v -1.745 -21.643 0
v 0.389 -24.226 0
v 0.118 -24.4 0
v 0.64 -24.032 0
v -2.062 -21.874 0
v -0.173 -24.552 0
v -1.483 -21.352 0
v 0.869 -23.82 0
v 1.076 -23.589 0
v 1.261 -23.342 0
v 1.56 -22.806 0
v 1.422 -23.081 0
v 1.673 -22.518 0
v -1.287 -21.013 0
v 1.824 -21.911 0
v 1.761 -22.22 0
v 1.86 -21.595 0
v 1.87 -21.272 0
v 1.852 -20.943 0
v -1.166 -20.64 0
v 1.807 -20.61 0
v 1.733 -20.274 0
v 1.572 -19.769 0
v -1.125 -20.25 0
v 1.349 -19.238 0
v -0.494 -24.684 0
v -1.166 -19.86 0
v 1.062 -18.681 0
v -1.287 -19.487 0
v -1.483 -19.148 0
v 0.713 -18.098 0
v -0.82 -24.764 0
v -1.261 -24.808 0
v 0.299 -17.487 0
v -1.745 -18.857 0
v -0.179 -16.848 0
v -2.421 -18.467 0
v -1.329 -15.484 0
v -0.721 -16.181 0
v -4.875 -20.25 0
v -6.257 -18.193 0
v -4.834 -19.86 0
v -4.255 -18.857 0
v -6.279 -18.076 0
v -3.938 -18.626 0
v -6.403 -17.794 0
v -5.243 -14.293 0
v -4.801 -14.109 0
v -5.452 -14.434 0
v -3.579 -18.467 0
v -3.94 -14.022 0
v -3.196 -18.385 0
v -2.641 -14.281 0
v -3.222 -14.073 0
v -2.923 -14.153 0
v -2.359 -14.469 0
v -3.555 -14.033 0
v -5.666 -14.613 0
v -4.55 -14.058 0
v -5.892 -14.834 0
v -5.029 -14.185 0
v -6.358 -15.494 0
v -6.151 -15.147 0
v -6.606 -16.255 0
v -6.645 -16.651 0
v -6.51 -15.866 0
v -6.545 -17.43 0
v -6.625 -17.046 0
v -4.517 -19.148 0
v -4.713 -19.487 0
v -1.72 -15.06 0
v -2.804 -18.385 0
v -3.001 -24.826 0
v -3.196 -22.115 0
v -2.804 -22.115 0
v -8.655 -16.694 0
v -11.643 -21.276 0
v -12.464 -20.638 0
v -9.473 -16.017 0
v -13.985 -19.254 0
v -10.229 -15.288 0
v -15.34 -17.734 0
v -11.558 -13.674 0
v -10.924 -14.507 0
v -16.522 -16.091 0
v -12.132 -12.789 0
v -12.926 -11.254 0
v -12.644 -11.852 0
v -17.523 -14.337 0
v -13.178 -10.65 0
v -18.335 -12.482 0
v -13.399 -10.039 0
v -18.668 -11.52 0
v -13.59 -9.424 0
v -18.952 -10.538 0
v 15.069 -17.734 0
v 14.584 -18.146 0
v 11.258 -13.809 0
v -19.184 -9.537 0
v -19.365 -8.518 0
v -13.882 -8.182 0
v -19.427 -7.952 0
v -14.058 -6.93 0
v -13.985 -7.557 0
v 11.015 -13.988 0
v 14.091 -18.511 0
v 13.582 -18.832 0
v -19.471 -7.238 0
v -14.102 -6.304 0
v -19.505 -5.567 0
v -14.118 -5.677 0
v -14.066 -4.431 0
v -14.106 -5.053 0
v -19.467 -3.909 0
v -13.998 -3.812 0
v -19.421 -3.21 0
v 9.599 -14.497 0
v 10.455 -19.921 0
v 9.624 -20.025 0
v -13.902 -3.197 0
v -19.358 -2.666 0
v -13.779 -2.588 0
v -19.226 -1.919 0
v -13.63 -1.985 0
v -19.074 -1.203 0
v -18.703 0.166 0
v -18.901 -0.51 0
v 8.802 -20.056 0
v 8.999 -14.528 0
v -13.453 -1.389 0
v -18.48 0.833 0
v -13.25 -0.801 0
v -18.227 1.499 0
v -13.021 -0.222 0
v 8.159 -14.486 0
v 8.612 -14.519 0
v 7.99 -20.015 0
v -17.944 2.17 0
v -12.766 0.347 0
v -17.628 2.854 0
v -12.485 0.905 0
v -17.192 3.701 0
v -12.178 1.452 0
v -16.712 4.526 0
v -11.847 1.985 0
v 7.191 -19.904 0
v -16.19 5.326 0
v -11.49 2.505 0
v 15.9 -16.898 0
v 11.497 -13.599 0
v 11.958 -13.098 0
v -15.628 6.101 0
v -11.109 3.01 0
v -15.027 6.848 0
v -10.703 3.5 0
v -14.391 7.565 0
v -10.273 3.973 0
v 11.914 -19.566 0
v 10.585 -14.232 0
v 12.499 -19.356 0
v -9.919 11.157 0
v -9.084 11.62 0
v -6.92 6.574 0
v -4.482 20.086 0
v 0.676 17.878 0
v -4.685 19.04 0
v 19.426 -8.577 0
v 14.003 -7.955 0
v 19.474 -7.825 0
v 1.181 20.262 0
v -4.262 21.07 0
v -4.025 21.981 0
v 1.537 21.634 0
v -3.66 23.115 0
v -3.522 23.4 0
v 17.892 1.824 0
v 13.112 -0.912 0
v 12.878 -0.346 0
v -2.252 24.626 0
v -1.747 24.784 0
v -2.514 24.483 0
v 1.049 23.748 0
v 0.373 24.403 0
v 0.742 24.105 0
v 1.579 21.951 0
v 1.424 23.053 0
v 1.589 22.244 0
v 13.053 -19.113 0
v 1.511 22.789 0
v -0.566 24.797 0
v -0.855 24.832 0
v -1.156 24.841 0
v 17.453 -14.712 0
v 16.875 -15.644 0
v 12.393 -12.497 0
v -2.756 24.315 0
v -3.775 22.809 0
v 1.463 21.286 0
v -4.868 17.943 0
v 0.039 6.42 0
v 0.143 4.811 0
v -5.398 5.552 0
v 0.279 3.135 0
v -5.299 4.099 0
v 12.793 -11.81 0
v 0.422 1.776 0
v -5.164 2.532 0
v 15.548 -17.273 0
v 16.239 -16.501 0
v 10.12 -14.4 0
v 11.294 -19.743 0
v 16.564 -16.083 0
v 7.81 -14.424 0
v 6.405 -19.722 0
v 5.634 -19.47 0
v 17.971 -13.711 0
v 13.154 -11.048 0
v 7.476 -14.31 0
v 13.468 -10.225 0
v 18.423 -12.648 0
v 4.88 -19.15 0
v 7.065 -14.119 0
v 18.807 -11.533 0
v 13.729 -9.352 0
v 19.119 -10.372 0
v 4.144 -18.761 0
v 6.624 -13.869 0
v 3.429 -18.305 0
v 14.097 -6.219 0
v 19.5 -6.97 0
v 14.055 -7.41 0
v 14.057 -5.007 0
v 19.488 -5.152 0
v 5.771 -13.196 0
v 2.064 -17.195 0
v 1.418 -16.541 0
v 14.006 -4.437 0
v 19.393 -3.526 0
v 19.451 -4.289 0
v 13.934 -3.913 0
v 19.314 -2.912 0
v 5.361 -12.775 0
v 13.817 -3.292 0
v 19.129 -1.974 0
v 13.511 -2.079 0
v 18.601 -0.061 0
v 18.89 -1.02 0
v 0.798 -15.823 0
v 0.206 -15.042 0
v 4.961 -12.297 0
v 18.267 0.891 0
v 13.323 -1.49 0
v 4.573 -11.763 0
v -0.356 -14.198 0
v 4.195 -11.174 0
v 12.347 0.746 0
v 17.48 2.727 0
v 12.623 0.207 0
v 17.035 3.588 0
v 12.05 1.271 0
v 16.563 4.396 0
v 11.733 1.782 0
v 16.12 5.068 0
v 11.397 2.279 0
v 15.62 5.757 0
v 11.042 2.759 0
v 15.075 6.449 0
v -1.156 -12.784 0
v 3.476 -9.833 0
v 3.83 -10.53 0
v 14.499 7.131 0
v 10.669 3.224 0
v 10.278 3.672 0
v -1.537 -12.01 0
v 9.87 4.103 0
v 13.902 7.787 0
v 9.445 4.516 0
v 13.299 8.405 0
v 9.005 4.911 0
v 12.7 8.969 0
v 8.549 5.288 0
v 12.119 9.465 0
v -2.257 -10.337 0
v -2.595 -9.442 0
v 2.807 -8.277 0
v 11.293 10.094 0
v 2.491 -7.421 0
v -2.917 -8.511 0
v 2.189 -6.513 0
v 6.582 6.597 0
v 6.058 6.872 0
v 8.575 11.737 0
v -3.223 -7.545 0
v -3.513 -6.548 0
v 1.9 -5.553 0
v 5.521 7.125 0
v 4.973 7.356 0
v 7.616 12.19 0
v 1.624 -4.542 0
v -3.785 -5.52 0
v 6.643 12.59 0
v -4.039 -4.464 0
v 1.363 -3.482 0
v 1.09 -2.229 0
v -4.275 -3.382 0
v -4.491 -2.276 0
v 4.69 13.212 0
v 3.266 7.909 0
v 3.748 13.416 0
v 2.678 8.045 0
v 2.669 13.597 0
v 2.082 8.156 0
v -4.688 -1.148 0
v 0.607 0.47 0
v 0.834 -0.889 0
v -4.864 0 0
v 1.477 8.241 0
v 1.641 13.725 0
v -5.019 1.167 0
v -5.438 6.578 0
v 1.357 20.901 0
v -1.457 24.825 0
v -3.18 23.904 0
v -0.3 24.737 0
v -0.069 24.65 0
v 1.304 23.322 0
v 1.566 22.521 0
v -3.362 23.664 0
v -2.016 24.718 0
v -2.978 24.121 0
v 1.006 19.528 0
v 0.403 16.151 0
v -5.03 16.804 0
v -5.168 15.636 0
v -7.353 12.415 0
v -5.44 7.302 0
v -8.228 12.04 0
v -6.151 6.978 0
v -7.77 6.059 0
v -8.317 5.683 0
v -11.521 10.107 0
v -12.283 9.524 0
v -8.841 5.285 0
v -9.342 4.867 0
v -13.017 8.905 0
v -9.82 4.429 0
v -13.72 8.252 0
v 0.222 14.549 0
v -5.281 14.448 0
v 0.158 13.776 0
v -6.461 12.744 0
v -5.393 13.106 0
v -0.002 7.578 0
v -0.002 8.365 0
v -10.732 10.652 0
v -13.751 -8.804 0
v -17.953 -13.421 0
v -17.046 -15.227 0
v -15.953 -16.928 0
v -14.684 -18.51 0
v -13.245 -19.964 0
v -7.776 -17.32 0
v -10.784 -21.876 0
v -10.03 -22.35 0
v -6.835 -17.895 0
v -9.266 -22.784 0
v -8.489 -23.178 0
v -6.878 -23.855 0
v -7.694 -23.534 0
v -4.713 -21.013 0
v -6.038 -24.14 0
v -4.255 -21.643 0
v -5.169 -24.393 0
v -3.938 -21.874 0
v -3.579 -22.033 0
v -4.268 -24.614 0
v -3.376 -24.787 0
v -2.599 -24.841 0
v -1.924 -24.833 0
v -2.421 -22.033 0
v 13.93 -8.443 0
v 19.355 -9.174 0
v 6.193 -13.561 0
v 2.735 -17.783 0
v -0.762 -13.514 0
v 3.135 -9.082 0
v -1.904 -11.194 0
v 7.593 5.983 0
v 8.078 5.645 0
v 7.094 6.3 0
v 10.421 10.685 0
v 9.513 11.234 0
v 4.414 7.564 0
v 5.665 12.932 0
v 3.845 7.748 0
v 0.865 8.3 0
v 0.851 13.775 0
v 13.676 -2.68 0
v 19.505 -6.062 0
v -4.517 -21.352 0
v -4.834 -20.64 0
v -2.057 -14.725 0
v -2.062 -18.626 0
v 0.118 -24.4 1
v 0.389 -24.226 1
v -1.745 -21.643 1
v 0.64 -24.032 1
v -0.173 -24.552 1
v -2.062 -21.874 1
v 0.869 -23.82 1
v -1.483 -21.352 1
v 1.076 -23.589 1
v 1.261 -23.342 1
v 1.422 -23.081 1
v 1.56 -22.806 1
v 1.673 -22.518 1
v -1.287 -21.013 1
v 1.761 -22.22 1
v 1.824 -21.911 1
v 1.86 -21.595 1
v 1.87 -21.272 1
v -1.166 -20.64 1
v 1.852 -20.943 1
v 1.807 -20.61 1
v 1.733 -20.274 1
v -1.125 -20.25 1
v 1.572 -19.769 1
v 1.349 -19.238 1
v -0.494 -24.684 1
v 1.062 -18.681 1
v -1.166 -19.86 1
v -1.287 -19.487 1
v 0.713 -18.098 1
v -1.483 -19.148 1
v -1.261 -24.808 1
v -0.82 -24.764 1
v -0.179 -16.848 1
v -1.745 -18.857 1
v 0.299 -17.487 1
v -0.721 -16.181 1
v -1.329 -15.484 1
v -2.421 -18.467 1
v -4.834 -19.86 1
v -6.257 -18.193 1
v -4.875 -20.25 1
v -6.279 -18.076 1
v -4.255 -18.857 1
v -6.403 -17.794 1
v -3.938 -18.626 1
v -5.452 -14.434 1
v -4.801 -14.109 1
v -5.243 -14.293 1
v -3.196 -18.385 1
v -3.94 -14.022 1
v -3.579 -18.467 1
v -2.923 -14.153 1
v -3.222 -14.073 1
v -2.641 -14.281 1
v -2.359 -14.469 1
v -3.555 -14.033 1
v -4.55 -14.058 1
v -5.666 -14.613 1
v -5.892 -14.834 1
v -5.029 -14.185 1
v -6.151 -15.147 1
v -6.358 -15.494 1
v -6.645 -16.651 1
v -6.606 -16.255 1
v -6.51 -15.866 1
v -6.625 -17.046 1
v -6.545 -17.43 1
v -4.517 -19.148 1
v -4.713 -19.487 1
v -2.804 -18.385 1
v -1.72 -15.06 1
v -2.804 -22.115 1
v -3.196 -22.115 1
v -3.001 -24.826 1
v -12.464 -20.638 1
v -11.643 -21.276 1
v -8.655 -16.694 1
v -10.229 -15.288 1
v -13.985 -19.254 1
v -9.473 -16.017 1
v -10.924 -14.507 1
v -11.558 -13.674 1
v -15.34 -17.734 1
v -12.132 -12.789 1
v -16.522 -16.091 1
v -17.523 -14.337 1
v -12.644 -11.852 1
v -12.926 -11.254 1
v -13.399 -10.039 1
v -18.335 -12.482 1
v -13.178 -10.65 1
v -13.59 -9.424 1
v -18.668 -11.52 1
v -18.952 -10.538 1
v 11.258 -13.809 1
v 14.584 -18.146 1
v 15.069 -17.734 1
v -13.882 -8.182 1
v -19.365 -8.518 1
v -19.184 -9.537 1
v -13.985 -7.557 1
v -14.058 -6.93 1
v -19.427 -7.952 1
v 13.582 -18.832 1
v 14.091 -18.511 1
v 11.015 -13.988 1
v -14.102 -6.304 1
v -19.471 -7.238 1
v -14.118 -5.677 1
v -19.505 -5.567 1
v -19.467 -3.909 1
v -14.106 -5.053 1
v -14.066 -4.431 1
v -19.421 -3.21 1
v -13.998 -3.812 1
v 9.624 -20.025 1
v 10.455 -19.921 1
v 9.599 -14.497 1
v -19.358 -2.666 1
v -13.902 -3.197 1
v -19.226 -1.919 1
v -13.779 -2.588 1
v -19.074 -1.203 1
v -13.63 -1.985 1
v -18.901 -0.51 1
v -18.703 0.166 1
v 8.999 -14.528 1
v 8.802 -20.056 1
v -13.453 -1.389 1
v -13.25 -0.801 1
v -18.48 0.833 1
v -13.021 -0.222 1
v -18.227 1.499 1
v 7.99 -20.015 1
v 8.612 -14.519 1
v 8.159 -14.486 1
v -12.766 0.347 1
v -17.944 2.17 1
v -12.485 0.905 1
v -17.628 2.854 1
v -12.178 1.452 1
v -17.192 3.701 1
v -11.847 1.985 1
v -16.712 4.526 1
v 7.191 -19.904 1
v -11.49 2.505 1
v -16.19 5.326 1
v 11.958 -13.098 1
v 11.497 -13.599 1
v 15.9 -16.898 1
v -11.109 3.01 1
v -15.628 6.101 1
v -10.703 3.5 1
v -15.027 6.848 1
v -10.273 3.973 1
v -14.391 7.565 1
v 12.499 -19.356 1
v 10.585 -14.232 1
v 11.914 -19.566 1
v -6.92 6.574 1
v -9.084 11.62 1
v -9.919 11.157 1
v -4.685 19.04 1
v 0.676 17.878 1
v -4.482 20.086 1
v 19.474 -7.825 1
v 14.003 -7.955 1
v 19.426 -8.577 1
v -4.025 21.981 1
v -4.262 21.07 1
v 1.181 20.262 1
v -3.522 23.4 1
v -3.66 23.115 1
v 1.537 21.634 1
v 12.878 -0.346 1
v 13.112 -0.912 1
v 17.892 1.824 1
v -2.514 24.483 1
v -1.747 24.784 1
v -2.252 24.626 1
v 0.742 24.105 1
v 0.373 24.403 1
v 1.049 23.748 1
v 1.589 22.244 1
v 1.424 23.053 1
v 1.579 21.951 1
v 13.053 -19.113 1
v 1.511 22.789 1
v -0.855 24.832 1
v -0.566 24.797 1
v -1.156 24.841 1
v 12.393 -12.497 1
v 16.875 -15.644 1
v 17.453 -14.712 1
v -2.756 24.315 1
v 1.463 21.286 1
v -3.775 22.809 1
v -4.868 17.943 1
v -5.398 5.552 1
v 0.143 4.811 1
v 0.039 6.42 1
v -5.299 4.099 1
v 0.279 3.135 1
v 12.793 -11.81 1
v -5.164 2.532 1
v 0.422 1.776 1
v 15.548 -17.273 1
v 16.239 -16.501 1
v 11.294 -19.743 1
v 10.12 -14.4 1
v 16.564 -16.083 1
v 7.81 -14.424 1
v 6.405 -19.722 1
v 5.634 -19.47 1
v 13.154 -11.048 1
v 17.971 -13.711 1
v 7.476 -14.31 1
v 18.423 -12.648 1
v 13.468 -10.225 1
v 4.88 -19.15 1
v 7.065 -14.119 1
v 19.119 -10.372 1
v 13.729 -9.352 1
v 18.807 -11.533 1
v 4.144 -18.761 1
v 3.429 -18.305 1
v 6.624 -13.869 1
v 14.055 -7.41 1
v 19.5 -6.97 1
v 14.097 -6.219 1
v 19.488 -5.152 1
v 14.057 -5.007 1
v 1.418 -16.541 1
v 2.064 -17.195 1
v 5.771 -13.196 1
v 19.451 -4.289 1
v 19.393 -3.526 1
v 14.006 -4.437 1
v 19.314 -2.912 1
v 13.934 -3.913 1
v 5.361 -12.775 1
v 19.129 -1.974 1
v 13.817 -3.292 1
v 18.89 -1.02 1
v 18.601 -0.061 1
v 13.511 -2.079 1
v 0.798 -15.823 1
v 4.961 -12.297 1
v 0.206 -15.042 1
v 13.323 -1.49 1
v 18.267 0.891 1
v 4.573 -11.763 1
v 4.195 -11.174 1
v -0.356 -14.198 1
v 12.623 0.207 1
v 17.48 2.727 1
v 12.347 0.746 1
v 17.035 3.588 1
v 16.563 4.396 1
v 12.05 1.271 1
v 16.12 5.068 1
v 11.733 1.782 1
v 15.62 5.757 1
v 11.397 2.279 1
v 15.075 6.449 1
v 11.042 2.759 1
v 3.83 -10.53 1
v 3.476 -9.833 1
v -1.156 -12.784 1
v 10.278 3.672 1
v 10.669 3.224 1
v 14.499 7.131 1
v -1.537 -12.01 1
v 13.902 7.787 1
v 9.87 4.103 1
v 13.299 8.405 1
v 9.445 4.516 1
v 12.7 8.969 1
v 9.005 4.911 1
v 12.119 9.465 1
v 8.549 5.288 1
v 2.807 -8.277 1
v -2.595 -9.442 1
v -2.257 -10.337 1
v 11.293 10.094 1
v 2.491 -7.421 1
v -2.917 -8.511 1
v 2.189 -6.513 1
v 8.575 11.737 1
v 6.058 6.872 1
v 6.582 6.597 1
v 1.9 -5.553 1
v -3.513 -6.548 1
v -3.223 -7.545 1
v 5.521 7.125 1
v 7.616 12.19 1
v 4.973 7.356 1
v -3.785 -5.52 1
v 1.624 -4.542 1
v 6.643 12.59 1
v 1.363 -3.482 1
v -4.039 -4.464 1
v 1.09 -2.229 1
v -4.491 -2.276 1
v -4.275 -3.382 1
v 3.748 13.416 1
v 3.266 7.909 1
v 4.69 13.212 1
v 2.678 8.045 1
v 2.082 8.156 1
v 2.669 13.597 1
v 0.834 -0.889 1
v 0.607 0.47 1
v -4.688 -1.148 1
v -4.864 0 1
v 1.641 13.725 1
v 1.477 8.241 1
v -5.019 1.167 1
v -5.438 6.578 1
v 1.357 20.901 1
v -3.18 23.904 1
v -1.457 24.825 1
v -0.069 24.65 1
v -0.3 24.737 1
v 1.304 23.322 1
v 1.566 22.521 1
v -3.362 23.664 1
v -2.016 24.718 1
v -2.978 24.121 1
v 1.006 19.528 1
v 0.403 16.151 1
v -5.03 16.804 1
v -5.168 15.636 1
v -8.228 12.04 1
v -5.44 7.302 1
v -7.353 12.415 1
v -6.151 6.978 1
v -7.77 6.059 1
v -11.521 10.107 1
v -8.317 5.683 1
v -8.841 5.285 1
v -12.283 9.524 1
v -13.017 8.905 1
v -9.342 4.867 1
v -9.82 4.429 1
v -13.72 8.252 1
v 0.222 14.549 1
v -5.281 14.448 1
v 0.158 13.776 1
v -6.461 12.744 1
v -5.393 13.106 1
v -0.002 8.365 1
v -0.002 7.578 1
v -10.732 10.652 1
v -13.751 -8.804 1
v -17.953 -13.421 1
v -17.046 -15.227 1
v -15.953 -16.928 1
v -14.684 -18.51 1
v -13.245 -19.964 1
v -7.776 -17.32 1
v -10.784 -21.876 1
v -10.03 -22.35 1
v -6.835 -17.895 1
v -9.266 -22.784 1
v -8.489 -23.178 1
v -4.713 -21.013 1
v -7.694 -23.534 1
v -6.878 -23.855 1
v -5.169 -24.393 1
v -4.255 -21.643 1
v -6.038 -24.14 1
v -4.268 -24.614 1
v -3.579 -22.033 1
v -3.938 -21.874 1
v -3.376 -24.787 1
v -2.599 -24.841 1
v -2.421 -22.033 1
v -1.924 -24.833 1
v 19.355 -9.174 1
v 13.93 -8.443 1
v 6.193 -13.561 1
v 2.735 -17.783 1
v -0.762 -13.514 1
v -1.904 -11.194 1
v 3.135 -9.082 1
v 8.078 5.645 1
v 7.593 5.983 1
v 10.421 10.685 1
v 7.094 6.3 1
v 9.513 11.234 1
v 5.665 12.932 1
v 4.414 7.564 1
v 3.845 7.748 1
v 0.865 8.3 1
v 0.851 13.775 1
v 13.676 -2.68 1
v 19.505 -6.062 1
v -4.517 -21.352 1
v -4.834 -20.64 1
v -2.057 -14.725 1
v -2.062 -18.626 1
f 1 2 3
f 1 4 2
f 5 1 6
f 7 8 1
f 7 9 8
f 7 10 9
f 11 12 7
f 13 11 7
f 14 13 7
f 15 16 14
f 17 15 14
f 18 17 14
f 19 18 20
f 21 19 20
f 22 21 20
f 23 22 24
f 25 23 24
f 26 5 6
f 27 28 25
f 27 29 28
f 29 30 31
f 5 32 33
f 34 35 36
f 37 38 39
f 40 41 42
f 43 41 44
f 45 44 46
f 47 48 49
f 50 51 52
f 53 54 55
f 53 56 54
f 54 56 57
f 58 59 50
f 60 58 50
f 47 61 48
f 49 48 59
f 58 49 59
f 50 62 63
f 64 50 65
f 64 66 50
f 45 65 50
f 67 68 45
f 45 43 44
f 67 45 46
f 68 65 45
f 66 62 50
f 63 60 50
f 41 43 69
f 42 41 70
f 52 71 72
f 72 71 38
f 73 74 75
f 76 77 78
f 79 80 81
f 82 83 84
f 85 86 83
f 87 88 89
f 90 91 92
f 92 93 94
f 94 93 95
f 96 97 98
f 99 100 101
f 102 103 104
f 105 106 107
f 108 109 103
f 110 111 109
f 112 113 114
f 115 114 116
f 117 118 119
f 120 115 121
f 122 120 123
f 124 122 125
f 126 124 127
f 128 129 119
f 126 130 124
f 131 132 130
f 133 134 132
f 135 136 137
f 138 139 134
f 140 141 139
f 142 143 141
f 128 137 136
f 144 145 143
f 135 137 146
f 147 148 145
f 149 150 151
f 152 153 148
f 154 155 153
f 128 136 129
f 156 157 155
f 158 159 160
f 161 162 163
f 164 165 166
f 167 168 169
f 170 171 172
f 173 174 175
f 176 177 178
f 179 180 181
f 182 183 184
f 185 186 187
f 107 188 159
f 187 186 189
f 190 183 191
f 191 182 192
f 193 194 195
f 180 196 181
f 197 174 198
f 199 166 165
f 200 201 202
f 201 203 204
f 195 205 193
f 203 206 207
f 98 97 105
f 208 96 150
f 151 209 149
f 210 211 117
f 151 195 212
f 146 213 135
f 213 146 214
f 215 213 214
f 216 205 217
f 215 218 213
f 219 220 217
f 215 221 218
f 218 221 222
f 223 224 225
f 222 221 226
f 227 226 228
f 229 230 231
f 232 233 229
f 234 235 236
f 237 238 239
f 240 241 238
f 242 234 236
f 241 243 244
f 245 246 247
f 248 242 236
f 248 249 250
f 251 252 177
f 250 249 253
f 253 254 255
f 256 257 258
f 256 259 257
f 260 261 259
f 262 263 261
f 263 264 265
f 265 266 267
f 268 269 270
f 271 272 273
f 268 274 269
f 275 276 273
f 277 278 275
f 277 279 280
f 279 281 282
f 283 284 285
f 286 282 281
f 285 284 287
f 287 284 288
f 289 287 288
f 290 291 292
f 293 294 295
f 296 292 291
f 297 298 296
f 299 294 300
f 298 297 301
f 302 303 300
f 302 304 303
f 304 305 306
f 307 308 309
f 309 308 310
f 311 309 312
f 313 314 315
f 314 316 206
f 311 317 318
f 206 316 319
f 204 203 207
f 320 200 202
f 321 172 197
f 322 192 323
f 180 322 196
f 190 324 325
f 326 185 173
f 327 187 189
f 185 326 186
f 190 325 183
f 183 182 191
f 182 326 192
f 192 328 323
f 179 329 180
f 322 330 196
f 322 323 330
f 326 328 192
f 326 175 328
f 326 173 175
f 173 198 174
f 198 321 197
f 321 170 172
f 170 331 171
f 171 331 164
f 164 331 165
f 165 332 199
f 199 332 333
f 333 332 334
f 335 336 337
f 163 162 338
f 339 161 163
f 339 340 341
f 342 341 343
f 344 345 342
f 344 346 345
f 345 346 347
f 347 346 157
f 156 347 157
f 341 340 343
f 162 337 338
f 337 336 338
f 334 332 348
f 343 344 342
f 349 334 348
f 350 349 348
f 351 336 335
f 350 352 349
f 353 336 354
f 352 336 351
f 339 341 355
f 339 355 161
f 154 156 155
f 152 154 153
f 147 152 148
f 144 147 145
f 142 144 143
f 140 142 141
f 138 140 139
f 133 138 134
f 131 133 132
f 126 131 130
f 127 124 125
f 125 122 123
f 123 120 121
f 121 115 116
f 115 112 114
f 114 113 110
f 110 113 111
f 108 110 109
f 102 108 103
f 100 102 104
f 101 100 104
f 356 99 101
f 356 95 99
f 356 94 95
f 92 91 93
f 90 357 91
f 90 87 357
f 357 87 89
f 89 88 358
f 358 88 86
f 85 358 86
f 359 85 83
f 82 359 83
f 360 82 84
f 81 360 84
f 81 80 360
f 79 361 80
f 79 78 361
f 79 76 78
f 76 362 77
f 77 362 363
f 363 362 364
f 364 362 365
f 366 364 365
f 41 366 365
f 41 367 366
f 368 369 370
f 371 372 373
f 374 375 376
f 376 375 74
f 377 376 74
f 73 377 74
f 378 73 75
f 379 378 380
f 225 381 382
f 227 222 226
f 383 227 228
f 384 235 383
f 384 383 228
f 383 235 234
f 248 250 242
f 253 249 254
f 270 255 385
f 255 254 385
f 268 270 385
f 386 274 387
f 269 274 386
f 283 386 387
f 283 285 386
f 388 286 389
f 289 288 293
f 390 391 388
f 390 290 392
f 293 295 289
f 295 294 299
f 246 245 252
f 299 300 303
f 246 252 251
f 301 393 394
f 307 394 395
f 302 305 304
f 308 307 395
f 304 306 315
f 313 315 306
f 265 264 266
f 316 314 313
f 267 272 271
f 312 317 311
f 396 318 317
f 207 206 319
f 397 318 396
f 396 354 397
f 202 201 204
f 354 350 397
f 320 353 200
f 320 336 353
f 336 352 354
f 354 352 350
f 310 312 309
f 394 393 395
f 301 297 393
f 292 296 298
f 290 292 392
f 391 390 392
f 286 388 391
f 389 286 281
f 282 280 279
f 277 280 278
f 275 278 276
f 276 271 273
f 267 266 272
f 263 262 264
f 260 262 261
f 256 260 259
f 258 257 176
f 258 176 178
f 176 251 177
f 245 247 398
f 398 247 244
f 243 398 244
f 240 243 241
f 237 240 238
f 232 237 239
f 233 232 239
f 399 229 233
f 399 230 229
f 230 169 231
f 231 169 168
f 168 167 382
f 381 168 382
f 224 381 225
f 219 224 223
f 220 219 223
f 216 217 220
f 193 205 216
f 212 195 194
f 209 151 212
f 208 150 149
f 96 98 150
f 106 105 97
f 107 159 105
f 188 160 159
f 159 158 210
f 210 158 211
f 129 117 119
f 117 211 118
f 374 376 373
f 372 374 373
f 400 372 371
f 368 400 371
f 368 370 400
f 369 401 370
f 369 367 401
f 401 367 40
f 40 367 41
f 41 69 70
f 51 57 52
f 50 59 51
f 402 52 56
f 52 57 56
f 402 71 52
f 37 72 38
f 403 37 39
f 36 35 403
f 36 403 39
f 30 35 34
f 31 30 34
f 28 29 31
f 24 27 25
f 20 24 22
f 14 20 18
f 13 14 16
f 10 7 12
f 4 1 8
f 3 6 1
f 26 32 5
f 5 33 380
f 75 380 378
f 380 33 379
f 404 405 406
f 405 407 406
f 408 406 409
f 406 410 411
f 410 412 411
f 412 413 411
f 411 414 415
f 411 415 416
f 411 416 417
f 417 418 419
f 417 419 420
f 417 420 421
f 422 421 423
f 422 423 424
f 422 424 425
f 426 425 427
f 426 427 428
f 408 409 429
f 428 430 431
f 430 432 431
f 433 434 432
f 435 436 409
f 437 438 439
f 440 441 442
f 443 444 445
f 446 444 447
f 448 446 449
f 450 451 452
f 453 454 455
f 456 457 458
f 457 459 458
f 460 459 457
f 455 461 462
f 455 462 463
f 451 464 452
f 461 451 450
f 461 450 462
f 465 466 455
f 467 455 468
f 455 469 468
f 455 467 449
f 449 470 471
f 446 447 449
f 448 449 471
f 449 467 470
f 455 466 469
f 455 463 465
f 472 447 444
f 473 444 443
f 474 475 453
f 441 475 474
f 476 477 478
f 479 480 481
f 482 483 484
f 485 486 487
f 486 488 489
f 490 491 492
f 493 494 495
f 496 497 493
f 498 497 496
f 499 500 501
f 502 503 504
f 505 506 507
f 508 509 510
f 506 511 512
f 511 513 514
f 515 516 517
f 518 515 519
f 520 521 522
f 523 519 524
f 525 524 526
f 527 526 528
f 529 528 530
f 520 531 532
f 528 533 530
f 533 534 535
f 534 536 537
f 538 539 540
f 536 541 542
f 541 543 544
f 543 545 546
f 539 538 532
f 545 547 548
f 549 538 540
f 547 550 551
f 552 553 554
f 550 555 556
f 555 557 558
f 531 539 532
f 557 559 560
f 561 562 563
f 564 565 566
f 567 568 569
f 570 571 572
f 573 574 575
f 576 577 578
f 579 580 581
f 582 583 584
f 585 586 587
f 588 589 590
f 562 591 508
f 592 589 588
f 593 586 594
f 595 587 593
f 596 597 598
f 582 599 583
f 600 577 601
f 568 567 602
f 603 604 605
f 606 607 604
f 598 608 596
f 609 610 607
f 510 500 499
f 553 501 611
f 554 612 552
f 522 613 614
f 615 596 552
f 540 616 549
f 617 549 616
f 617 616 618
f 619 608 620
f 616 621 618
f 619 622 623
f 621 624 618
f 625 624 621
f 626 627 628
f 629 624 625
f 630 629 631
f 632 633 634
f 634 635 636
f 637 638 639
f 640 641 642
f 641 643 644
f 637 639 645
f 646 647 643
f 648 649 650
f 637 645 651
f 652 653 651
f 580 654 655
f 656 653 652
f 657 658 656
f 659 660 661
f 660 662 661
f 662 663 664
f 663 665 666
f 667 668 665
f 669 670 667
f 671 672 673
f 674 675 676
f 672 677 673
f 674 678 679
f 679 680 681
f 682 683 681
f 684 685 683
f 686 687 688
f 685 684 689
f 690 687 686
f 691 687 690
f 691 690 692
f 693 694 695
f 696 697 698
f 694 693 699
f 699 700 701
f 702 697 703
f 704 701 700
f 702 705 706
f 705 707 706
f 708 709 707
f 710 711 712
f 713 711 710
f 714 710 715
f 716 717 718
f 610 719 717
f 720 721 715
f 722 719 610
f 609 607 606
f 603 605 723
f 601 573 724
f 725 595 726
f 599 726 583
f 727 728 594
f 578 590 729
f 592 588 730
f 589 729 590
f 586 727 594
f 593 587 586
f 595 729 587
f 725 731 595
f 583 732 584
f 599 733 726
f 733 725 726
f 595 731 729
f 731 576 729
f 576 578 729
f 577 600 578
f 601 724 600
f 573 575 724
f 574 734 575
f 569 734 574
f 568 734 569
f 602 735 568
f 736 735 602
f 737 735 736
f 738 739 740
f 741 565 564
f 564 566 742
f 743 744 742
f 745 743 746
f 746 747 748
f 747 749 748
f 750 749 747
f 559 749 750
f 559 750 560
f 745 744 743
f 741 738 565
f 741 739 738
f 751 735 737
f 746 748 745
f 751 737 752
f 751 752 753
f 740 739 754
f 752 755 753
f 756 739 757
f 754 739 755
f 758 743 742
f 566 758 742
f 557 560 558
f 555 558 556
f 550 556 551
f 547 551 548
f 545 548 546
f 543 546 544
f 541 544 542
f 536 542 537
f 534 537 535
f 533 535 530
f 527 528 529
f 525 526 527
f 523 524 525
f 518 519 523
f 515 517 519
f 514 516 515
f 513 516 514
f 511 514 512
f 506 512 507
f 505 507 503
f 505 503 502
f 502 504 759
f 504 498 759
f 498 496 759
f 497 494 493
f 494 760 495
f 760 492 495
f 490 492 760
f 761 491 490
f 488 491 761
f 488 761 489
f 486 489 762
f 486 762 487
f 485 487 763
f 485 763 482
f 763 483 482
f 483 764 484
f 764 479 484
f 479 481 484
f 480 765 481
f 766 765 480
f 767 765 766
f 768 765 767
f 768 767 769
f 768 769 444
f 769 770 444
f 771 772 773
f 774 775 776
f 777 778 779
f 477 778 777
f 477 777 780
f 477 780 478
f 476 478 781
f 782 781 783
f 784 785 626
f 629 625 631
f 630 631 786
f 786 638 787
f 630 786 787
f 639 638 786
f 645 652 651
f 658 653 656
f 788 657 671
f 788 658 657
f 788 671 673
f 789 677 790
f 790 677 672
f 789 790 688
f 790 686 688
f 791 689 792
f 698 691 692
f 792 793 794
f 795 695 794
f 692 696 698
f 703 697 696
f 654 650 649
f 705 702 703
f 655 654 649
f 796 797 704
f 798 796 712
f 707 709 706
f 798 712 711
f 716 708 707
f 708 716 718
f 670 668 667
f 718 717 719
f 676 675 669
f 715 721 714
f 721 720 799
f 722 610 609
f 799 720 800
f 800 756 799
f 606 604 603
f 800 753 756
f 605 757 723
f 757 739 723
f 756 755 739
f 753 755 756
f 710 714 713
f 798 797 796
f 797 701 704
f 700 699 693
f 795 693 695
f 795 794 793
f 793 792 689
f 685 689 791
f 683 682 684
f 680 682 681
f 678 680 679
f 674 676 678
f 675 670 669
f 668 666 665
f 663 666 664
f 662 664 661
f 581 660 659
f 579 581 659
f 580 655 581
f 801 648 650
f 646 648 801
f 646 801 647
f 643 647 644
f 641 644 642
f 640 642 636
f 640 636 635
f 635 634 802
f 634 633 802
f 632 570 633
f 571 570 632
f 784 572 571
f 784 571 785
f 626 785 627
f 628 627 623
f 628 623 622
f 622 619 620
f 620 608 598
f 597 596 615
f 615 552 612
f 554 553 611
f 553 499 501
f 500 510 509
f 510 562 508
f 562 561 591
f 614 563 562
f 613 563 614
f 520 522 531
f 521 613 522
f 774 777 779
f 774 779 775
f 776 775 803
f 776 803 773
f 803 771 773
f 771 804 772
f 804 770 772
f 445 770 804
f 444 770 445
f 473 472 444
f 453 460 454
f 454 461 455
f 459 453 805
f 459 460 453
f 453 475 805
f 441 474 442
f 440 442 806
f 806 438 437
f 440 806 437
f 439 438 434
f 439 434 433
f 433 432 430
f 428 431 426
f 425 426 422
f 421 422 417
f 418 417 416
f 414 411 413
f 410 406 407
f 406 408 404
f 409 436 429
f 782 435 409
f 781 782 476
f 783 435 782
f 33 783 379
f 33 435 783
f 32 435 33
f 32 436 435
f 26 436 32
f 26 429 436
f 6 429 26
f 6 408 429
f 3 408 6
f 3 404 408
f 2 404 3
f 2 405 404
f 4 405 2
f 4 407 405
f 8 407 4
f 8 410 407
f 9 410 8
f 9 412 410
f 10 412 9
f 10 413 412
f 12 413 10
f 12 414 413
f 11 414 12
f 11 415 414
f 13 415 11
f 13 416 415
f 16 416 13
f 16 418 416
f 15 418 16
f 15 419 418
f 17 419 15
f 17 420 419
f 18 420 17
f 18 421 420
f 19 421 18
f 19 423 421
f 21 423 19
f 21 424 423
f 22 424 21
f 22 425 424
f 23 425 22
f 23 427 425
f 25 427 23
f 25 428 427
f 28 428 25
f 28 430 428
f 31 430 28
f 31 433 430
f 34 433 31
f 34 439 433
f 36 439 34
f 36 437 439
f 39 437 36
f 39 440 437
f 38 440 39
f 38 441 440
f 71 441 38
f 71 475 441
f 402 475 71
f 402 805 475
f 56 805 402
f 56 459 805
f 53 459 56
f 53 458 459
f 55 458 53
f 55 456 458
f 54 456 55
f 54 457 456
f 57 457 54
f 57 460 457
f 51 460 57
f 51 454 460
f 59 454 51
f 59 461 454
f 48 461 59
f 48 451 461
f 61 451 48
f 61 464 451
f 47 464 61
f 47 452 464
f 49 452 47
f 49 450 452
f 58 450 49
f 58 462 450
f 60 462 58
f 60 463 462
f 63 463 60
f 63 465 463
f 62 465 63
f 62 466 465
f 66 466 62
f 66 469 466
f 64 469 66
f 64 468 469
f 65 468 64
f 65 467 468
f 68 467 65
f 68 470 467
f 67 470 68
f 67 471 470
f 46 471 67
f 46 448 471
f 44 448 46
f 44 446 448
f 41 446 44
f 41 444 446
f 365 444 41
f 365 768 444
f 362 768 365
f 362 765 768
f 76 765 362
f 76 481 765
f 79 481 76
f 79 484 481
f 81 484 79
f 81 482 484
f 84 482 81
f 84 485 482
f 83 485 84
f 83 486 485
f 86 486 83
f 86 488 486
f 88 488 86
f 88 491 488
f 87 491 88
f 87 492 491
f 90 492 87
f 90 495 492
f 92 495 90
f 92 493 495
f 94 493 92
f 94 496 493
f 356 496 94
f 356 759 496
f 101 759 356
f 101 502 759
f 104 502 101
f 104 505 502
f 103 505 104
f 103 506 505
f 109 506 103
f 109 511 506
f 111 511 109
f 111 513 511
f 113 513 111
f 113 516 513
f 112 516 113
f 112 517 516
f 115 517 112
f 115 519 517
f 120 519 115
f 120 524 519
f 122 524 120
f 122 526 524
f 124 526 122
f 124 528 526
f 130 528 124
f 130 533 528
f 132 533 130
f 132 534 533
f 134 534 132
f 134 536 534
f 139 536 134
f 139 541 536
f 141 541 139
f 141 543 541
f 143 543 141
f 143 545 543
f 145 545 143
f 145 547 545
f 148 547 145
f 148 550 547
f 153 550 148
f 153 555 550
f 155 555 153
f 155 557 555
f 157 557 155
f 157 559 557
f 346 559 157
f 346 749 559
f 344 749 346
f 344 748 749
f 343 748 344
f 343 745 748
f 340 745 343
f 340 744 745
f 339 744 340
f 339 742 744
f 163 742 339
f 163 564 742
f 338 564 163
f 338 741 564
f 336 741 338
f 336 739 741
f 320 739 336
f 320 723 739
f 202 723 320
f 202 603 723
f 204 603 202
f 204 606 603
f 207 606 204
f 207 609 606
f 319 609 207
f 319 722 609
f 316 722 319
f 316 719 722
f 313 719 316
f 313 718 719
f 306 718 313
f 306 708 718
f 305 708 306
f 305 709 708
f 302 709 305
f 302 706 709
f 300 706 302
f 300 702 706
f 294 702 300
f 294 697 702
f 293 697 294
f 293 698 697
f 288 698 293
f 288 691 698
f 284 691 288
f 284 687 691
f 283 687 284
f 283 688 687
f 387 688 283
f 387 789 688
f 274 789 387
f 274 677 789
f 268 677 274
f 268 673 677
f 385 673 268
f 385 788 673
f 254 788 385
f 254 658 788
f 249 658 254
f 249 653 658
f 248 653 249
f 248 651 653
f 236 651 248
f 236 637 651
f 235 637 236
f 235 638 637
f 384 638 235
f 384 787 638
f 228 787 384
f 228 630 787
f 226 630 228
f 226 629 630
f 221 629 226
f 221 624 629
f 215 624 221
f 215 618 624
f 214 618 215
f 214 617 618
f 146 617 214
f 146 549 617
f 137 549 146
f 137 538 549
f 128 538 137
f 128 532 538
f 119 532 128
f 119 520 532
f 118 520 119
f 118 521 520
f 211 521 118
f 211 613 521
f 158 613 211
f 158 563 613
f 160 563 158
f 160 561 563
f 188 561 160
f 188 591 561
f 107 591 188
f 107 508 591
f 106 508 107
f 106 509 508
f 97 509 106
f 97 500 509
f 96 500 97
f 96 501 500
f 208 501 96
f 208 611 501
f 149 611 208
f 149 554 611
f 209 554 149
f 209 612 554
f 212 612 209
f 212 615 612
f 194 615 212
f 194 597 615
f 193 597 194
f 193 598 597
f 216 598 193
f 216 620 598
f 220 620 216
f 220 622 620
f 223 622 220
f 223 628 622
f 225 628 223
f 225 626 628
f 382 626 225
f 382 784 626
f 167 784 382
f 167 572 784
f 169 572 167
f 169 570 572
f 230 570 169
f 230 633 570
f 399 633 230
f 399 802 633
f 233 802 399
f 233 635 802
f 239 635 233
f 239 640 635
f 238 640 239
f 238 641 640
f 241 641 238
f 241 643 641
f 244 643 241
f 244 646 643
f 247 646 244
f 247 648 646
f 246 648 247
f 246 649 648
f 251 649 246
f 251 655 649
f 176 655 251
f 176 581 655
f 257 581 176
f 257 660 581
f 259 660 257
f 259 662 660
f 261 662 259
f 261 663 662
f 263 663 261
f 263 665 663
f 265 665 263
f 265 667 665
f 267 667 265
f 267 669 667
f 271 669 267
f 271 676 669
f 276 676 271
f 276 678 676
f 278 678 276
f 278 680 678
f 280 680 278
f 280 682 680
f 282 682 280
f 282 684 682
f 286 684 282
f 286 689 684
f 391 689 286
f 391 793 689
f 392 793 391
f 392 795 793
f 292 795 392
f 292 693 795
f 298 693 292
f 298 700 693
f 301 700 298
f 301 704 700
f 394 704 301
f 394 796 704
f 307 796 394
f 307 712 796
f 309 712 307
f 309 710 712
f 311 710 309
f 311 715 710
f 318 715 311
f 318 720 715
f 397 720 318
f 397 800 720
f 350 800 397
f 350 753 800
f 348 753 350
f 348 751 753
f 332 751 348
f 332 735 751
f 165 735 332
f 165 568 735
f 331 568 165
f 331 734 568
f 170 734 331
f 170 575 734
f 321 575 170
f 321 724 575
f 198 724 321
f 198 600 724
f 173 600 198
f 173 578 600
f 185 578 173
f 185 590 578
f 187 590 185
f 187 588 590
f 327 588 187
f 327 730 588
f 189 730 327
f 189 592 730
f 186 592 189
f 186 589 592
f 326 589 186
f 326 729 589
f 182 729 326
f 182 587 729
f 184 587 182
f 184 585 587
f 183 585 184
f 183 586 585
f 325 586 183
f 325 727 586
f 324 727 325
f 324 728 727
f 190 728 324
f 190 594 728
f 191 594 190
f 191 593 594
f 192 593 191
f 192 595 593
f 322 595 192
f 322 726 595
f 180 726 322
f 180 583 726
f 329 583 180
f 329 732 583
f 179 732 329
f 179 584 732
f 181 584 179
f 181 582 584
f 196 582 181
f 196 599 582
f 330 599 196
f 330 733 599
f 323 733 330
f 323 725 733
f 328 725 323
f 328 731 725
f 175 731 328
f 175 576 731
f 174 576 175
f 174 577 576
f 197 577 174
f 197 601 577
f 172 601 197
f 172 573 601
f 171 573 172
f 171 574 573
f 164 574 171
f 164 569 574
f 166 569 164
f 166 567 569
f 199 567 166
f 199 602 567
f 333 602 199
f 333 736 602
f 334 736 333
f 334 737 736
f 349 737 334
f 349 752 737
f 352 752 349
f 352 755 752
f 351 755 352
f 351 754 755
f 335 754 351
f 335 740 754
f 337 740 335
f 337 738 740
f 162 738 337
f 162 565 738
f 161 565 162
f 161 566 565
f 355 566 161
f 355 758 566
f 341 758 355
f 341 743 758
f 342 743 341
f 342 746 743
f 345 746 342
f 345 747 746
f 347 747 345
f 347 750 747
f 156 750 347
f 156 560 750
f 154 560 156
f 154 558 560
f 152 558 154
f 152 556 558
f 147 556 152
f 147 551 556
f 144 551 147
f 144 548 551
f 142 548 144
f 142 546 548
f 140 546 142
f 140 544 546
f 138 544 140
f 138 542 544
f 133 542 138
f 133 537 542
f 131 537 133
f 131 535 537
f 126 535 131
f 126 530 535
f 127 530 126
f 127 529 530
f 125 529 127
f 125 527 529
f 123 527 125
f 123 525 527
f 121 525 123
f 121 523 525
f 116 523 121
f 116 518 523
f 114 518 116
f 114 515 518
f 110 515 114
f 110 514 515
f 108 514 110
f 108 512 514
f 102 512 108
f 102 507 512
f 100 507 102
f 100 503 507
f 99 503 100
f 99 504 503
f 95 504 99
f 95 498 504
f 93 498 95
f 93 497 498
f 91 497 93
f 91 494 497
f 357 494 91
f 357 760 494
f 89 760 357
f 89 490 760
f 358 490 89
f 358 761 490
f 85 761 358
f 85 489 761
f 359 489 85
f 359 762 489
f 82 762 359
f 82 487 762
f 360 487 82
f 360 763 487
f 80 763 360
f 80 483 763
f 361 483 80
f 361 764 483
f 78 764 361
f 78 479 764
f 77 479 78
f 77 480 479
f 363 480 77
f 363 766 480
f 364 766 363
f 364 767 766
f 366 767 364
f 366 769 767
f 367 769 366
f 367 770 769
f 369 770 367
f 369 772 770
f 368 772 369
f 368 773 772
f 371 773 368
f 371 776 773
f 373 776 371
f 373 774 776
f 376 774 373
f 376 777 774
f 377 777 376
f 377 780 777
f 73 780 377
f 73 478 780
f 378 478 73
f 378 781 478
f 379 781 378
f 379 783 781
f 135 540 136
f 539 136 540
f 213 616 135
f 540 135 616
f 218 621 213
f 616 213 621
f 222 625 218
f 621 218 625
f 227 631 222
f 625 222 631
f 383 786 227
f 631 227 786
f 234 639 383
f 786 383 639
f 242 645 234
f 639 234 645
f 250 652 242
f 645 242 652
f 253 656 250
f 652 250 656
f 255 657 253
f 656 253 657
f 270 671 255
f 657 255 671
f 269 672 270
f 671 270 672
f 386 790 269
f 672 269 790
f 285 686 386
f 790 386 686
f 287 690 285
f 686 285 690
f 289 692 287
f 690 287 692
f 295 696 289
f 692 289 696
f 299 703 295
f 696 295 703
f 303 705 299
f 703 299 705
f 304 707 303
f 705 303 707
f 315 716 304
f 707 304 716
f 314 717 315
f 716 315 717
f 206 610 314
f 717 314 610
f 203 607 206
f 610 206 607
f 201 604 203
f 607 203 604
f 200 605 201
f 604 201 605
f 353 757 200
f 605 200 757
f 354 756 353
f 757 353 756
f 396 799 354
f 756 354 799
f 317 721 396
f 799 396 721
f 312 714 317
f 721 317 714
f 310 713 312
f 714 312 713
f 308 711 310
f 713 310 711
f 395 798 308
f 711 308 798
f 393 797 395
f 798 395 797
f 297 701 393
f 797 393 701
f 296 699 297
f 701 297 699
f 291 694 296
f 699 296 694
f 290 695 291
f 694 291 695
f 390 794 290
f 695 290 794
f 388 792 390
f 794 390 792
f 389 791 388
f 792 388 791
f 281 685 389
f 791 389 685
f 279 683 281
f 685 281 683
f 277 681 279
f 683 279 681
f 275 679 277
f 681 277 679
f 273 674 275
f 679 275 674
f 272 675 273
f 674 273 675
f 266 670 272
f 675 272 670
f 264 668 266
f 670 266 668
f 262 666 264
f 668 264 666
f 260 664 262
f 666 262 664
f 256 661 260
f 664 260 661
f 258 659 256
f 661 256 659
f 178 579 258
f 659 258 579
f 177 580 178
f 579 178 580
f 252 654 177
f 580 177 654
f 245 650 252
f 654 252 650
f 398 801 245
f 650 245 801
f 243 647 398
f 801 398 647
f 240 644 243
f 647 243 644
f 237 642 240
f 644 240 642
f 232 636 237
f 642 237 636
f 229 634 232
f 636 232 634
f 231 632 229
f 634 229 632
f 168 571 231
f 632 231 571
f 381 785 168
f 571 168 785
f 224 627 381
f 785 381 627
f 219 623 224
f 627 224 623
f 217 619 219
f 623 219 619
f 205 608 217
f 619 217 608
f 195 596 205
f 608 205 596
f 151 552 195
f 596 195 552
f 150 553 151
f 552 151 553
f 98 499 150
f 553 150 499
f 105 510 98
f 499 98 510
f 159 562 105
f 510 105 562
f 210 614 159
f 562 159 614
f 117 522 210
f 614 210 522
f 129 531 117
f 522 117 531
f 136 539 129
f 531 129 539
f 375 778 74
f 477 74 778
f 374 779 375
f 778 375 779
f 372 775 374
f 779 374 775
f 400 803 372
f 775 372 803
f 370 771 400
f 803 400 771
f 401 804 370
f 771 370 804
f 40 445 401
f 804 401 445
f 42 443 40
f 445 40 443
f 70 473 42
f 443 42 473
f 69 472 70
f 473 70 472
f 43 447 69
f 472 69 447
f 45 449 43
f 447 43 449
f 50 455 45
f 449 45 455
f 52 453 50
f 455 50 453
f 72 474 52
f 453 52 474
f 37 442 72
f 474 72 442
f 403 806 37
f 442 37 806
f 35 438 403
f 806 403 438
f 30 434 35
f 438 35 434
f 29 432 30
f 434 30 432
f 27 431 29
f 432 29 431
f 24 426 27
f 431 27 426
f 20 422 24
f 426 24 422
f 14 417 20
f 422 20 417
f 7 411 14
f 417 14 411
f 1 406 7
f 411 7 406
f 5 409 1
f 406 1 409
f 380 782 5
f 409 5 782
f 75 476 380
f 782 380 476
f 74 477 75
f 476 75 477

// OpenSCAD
// L'épaisseur du logo, en mm. Sélectionnez 0 pour avoir la version 2D.
epaisseur = 1; // [0:0.5:10]

// Diamètre du trou, en mm.
diametre_trou = 1;

// La taille du logo, en mm.
hauteur = 50; // [10:2:100]

if(epaisseur==0) {
	phi();
} else {
	linear_extrude(epaisseur) {
		phi();
	}
}

module phi() {
	scale(hauteur*0.0015) difference() {
		polygon([[-34.658254,-331.218039],[-40.018819,-331.015675],[-45.016244,-330.488857],[-56.906304,-328.182883],[-68.917539,-325.237399],[-80.501404,-321.870971],[-91.707033,-318.062930],[-102.583559,-313.792606],[-113.180116,-309.039328],[-123.545837,-303.782426],[-133.729855,-298.001230],[-143.781304,-291.675071],[-155.238967,-283.679351],[-166.180618,-275.174899],[-176.593776,-266.181143],[-186.465962,-256.717513],[-195.784694,-246.803435],[-204.537493,-236.458338],[-212.711877,-225.701649],[-220.295366,-214.552797],[-227.275480,-203.031210],[-233.639739,-191.156315],[-239.375661,-178.947541],[-244.470766,-166.424316],[-248.912575,-153.606068],[-252.688606,-140.512225],[-255.786379,-127.162214],[-258.193413,-113.575465],[-259.023233,-106.031160],[-259.611116,-96.510544],[-260.064207,-74.230654],[-259.558952,-52.116331],[-258.948902,-42.802676],[-258.101616,-35.548115],[-256.340371,-25.584831],[-254.319758,-16.034963],[-252.009204,-6.800816],[-249.378132,2.215305],[-246.395967,11.111096],[-243.032135,19.984253],[-239.256058,28.932471],[-235.037163,38.053445],[-229.226579,49.347008],[-222.828099,60.341644],[-215.867852,71.014206],[-208.371966,81.341547],[-200.366571,91.300520],[-191.877795,100.867976],[-182.931766,110.020769],[-173.554614,118.735751],[-163.772467,126.989775],[-153.611454,134.759693],[-143.097703,142.022358],[-132.257344,148.754622],[-121.116505,154.933338],[-109.701314,160.535359],[-98.037901,165.537537],[-86.152394,169.916725],[-71.906304,174.740945],[-70.414114,192.633525],[-68.908814,208.478426],[-67.065627,224.059892],[-64.909931,239.236946],[-62.467107,253.868610],[-59.762531,267.813906],[-56.821583,280.931856],[-53.669641,293.081481],[-50.332084,304.121805],[-48.794857,308.205127],[-46.956133,312.005743],[-44.823751,315.514291],[-42.405549,318.721410],[-39.709365,321.617738],[-36.743038,324.193915],[-33.514404,326.440577],[-30.031304,328.348365],[-26.882302,329.567820],[-23.296264,330.453691],[-19.421652,331.004318],[-15.406924,331.218039],[-11.400542,331.093192],[-7.550966,330.628117],[-4.006657,329.821152],[-0.916074,328.670635],[4.968414,325.367637],[9.892791,321.398929],[13.986956,316.638826],[17.380806,310.961645],[18.983973,307.375241],[20.150443,303.846960],[20.882272,300.283563],[21.181513,296.591811],[21.050222,292.678467],[20.490452,288.450292],[19.504259,283.814048],[18.093696,278.676495],[15.751753,270.160283],[13.418185,260.378880],[9.017038,238.368320],[5.371993,215.340460],[2.964786,193.990945],[2.109316,183.678445],[11.351506,183.664775],[21.875154,183.003416],[35.585092,181.287613],[49.973159,178.884903],[62.531196,176.162825],[75.539601,172.425516],[88.579622,167.865676],[101.546011,162.536381],[114.333520,156.490709],[126.836900,149.781736],[138.950903,142.462540],[150.570281,134.586198],[161.589786,126.205785],[169.336541,119.585379],[177.316969,112.064875],[185.365588,103.833061],[193.316920,95.078730],[201.005485,85.990671],[208.265804,76.757676],[214.932397,67.568533],[220.839786,58.612035],[227.137276,47.837529],[233.061437,36.353857],[238.554356,24.314932],[243.558121,11.874666],[248.014819,-0.813028],[251.866538,-13.594238],[255.055364,-26.315051],[257.523386,-38.821555],[258.568004,-47.009090],[259.342640,-57.189370],[259.842854,-68.687481],[260.064207,-80.828509],[260.002259,-92.937539],[259.652571,-104.339658],[259.010703,-114.359951],[258.072216,-122.323505],[254.924554,-138.298994],[250.765903,-153.773849],[245.644999,-168.644363],[239.610578,-182.806827],[232.711377,-196.157534],[224.996130,-208.592774],[220.847720,-214.434686],[216.513575,-220.008841],[211.999786,-225.302275],[207.312446,-230.302025],[200.914164,-236.452641],[194.458195,-241.941034],[187.874412,-246.807894],[181.092691,-251.093915],[174.042907,-254.839787],[166.654935,-258.086203],[158.858649,-260.873855],[150.583926,-263.243435],[139.404862,-265.608375],[128.323390,-266.994925],[117.360623,-267.413136],[106.537676,-266.873058],[95.875663,-265.384742],[85.395699,-262.958238],[75.118897,-259.603597],[65.066372,-255.330869],[55.259238,-250.150104],[45.718610,-244.071354],[36.465602,-237.104668],[27.521328,-229.260097],[18.906902,-220.547692],[10.643438,-210.977503],[2.752051,-200.559580],[-4.746144,-189.303975],[-10.162924,-180.190888],[-15.413864,-170.459629],[-20.490760,-160.137220],[-25.385410,-149.250683],[-30.089610,-137.827043],[-34.595156,-125.893320],[-38.893846,-113.476538],[-42.977477,-100.603719],[-46.837844,-87.301885],[-50.466745,-73.598061],[-53.855976,-59.519267],[-56.997334,-45.092527],[-59.882617,-30.344863],[-62.503620,-15.303298],[-64.852140,0.005146],[-66.919974,15.553445],[-68.857703,33.765131],[-70.650253,54.654216],[-71.973661,74.031979],[-72.503964,87.709695],[-72.531304,97.365945],[-82.017634,93.041725],[-92.271214,87.659836],[-103.601614,80.791725],[-110.894834,75.768475],[-117.882552,70.462895],[-124.561369,64.887479],[-130.927885,59.054720],[-136.978700,52.977109],[-142.710413,46.667142],[-148.119626,40.137309],[-153.202937,33.400105],[-157.956946,26.468021],[-162.378254,19.353552],[-166.463460,12.069190],[-170.209165,4.627428],[-173.611968,-2.959242],[-176.668470,-10.678325],[-179.375270,-18.517330],[-181.728968,-26.463764],[-183.726164,-34.505132],[-185.363459,-42.628944],[-186.637451,-50.822705],[-187.544742,-59.073922],[-188.081930,-67.370103],[-188.245616,-75.698755],[-188.032401,-84.047385],[-187.438883,-92.403500],[-186.461662,-100.754607],[-185.097340,-109.088213],[-183.342515,-117.391825],[-181.193788,-125.652950],[-178.647758,-133.859096],[-175.701026,-141.997769],[-172.350191,-150.056476],[-168.591854,-158.022725],[-161.754187,-170.524527],[-154.109343,-182.326188],[-145.654453,-193.430702],[-136.386650,-203.841064],[-126.303068,-213.560266],[-115.400837,-222.591303],[-103.677092,-230.937168],[-91.128964,-238.600855],[-83.429744,-242.571555],[-83.724830,-241.011010],[-85.377004,-237.259055],[-87.269774,-232.397569],[-88.337307,-227.276837],[-88.600209,-222.016146],[-88.079085,-216.734784],[-86.794543,-211.552036],[-84.767188,-206.587191],[-82.017626,-201.959535],[-78.566464,-197.788355],[-75.543416,-194.841031],[-72.698939,-192.450954],[-69.910698,-190.567222],[-67.056358,-189.138932],[-64.013584,-188.115185],[-60.660040,-187.445077],[-52.531304,-186.962175],[-47.398026,-187.106202],[-42.958396,-187.641754],[-38.977195,-188.700532],[-35.219200,-190.414240],[-31.449193,-192.914579],[-27.431954,-196.333253],[-22.932261,-200.801964],[-17.714894,-206.452415],[-9.616637,-215.740200],[-2.384644,-224.639439],[3.986222,-233.158099],[9.501098,-241.304147],[14.165123,-249.085550],[17.983434,-256.510274],[20.961169,-263.586287],[23.103466,-270.321555],[24.091456,-274.801015],[24.698815,-279.241743],[24.933493,-283.625900],[24.803439,-287.935645],[24.316603,-292.153140],[23.480936,-296.260543],[22.304386,-300.240015],[20.794903,-304.073715],[18.960438,-307.743804],[16.808940,-311.232443],[14.348359,-314.521790],[11.586644,-317.594005],[8.531746,-320.431250],[5.191613,-323.015684],[1.574197,-325.329466],[-2.312554,-327.354758],[-6.588208,-329.125571],[-10.936223,-330.185558],[-16.808341,-330.767645],[-25.656304,-331.104758],[-34.658254,-331.218039]]);

	polygon([[119.982366,-193.712175],[127.980403,-193.292964],[134.931096,-191.996679],[141.129103,-189.758338],[146.869086,-186.512965],[150.108373,-184.114914],[153.290876,-181.322894],[159.441594,-174.640540],[165.233365,-166.633102],[170.578313,-157.467776],[175.388563,-147.311761],[179.576239,-136.332254],[183.053465,-124.696453],[185.732366,-112.571555],[186.700907,-106.065577],[187.395057,-98.800872],[187.959281,-82.916679],[187.423232,-66.761778],[186.742042,-59.158689],[185.785106,-52.178975],[184.231229,-43.889255],[182.350420,-35.735131],[180.150265,-27.723692],[177.638350,-19.862028],[174.822262,-12.157228],[171.709587,-4.616382],[168.307912,2.753420],[164.624823,9.945090],[160.667906,16.951537],[156.444748,23.765673],[151.962935,30.380407],[147.230055,36.788650],[142.253692,42.983313],[137.041434,48.957306],[131.600867,54.703539],[125.939577,60.214924],[120.065151,65.484370],[113.985176,70.504788],[107.707237,75.269089],[101.238921,79.770183],[94.587815,84.000980],[87.761505,87.954392],[80.767577,91.623327],[73.613619,95.000698],[66.307215,98.079415],[58.855953,100.852387],[51.267419,103.312526],[43.549200,105.452742],[35.708881,107.265945],[27.754050,108.745047],[19.692293,109.882956],[11.531196,110.672585],[-0.031304,111.537825],[-0.021534,101.045635],[0.526641,85.597808],[1.900331,64.142004],[3.725686,41.796218],[5.628856,23.678445],[8.094168,6.262708],[11.118661,-11.849327],[14.534969,-29.722866],[18.175726,-46.423115],[21.657480,-60.565299],[25.326941,-74.038040],[29.180169,-86.833986],[33.213221,-98.945783],[37.422153,-110.366079],[41.803025,-121.087520],[46.351895,-131.102755],[51.064818,-140.404430],[55.937855,-148.985192],[60.967062,-156.837689],[66.148497,-163.954567],[71.478217,-170.328475],[76.952282,-175.952058],[82.566748,-180.817964],[88.317673,-184.918841],[94.201116,-188.247335],[99.683921,-190.796852],[104.138310,-192.326407],[108.780842,-193.150411],[114.828076,-193.583275],[119.982366,-193.712175]]);
		if(diametre_trou >=0) {
			translate([-40, -270]) circle(d=diametre_trou*hauteur);
		}
	}
}
